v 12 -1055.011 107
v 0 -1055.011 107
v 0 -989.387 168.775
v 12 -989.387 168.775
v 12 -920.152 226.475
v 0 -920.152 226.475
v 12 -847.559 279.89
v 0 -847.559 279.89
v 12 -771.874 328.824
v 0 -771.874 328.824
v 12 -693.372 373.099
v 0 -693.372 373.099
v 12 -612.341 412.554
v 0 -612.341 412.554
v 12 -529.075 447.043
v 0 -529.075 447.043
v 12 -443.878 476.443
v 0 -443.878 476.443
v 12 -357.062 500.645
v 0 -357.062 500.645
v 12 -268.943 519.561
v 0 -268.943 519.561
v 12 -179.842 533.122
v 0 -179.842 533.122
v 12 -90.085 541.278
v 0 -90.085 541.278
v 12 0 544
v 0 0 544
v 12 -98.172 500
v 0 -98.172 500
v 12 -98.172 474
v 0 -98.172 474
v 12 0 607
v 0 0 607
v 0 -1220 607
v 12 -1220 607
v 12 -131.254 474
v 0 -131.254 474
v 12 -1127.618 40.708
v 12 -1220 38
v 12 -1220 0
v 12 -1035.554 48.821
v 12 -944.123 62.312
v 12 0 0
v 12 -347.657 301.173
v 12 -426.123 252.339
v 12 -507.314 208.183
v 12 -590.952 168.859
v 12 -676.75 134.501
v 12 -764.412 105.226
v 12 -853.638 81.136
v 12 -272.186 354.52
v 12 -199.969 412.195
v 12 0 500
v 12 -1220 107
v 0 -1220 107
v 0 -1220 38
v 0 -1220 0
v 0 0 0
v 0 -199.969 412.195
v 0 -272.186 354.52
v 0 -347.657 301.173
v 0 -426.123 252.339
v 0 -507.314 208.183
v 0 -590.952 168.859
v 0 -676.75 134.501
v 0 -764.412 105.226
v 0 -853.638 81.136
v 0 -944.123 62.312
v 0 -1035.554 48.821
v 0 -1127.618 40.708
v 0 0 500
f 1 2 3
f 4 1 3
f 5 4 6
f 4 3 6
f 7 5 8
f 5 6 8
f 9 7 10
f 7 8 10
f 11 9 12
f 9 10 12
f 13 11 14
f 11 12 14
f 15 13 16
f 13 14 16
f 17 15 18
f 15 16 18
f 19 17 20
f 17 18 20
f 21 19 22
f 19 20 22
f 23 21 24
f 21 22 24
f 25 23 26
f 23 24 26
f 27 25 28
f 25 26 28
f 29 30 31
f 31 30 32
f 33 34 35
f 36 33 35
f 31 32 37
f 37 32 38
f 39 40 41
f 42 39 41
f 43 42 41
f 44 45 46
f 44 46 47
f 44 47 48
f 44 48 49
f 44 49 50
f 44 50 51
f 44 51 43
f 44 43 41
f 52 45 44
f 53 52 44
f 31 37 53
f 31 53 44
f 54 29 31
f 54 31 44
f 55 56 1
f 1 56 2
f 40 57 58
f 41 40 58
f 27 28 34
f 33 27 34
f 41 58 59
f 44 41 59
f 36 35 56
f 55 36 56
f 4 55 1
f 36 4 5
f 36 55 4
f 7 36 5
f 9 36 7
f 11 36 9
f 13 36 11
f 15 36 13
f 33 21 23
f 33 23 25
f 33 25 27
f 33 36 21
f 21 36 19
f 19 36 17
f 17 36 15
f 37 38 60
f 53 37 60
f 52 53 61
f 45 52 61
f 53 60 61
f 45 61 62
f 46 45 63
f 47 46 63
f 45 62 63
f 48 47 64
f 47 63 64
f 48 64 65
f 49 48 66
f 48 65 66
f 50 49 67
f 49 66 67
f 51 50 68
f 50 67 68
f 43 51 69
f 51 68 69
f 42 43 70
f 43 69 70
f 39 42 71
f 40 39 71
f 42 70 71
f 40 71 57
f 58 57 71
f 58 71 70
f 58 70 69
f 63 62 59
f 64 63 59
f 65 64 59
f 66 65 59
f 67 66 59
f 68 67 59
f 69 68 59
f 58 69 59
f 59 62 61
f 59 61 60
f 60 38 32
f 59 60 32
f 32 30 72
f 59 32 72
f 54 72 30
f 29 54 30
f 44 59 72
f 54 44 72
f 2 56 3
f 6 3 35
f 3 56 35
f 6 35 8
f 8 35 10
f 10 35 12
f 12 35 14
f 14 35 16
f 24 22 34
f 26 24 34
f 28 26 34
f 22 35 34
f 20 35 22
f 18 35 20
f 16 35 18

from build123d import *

# Parameters (mm, degrees)
F1_DEPTH = 12


with BuildPart() as f1:
    # F0 (on Right) → F1 (new body)
    with BuildSketch(Plane.YZ):
        with BuildLine():
            Line((-1104.633334, 0), (0, 0))
            Line((0, 0), (0, 500))
            Line((0, 500), (-98.172372, 500))
            Line((-98.172372, 500), (-98.172372, 474))
            Line((-98.172372, 474), (-131.254055, 474))
            ThreePointArc((-131.254055, 474), (-633.59917, 151.05124), (-1220, 38))
            Line((-1220, 38), (-1220, 0))
            Line((-1220, 0), (-1104.633334, 0))
        make_face()
        with BuildLine():
            Line((0, 544), (0, 607))
            Line((0, 607), (-1220, 607))
            Line((-1220, 607), (-1220, 107))
            Line((-1220, 107), (-1055.011327, 107))
            ThreePointArc((-1055.011327, 107), (-570.968016, 430.4274), (0, 544))
        make_face()
    extrude(amount=F1_DEPTH)


solid = f1.part
